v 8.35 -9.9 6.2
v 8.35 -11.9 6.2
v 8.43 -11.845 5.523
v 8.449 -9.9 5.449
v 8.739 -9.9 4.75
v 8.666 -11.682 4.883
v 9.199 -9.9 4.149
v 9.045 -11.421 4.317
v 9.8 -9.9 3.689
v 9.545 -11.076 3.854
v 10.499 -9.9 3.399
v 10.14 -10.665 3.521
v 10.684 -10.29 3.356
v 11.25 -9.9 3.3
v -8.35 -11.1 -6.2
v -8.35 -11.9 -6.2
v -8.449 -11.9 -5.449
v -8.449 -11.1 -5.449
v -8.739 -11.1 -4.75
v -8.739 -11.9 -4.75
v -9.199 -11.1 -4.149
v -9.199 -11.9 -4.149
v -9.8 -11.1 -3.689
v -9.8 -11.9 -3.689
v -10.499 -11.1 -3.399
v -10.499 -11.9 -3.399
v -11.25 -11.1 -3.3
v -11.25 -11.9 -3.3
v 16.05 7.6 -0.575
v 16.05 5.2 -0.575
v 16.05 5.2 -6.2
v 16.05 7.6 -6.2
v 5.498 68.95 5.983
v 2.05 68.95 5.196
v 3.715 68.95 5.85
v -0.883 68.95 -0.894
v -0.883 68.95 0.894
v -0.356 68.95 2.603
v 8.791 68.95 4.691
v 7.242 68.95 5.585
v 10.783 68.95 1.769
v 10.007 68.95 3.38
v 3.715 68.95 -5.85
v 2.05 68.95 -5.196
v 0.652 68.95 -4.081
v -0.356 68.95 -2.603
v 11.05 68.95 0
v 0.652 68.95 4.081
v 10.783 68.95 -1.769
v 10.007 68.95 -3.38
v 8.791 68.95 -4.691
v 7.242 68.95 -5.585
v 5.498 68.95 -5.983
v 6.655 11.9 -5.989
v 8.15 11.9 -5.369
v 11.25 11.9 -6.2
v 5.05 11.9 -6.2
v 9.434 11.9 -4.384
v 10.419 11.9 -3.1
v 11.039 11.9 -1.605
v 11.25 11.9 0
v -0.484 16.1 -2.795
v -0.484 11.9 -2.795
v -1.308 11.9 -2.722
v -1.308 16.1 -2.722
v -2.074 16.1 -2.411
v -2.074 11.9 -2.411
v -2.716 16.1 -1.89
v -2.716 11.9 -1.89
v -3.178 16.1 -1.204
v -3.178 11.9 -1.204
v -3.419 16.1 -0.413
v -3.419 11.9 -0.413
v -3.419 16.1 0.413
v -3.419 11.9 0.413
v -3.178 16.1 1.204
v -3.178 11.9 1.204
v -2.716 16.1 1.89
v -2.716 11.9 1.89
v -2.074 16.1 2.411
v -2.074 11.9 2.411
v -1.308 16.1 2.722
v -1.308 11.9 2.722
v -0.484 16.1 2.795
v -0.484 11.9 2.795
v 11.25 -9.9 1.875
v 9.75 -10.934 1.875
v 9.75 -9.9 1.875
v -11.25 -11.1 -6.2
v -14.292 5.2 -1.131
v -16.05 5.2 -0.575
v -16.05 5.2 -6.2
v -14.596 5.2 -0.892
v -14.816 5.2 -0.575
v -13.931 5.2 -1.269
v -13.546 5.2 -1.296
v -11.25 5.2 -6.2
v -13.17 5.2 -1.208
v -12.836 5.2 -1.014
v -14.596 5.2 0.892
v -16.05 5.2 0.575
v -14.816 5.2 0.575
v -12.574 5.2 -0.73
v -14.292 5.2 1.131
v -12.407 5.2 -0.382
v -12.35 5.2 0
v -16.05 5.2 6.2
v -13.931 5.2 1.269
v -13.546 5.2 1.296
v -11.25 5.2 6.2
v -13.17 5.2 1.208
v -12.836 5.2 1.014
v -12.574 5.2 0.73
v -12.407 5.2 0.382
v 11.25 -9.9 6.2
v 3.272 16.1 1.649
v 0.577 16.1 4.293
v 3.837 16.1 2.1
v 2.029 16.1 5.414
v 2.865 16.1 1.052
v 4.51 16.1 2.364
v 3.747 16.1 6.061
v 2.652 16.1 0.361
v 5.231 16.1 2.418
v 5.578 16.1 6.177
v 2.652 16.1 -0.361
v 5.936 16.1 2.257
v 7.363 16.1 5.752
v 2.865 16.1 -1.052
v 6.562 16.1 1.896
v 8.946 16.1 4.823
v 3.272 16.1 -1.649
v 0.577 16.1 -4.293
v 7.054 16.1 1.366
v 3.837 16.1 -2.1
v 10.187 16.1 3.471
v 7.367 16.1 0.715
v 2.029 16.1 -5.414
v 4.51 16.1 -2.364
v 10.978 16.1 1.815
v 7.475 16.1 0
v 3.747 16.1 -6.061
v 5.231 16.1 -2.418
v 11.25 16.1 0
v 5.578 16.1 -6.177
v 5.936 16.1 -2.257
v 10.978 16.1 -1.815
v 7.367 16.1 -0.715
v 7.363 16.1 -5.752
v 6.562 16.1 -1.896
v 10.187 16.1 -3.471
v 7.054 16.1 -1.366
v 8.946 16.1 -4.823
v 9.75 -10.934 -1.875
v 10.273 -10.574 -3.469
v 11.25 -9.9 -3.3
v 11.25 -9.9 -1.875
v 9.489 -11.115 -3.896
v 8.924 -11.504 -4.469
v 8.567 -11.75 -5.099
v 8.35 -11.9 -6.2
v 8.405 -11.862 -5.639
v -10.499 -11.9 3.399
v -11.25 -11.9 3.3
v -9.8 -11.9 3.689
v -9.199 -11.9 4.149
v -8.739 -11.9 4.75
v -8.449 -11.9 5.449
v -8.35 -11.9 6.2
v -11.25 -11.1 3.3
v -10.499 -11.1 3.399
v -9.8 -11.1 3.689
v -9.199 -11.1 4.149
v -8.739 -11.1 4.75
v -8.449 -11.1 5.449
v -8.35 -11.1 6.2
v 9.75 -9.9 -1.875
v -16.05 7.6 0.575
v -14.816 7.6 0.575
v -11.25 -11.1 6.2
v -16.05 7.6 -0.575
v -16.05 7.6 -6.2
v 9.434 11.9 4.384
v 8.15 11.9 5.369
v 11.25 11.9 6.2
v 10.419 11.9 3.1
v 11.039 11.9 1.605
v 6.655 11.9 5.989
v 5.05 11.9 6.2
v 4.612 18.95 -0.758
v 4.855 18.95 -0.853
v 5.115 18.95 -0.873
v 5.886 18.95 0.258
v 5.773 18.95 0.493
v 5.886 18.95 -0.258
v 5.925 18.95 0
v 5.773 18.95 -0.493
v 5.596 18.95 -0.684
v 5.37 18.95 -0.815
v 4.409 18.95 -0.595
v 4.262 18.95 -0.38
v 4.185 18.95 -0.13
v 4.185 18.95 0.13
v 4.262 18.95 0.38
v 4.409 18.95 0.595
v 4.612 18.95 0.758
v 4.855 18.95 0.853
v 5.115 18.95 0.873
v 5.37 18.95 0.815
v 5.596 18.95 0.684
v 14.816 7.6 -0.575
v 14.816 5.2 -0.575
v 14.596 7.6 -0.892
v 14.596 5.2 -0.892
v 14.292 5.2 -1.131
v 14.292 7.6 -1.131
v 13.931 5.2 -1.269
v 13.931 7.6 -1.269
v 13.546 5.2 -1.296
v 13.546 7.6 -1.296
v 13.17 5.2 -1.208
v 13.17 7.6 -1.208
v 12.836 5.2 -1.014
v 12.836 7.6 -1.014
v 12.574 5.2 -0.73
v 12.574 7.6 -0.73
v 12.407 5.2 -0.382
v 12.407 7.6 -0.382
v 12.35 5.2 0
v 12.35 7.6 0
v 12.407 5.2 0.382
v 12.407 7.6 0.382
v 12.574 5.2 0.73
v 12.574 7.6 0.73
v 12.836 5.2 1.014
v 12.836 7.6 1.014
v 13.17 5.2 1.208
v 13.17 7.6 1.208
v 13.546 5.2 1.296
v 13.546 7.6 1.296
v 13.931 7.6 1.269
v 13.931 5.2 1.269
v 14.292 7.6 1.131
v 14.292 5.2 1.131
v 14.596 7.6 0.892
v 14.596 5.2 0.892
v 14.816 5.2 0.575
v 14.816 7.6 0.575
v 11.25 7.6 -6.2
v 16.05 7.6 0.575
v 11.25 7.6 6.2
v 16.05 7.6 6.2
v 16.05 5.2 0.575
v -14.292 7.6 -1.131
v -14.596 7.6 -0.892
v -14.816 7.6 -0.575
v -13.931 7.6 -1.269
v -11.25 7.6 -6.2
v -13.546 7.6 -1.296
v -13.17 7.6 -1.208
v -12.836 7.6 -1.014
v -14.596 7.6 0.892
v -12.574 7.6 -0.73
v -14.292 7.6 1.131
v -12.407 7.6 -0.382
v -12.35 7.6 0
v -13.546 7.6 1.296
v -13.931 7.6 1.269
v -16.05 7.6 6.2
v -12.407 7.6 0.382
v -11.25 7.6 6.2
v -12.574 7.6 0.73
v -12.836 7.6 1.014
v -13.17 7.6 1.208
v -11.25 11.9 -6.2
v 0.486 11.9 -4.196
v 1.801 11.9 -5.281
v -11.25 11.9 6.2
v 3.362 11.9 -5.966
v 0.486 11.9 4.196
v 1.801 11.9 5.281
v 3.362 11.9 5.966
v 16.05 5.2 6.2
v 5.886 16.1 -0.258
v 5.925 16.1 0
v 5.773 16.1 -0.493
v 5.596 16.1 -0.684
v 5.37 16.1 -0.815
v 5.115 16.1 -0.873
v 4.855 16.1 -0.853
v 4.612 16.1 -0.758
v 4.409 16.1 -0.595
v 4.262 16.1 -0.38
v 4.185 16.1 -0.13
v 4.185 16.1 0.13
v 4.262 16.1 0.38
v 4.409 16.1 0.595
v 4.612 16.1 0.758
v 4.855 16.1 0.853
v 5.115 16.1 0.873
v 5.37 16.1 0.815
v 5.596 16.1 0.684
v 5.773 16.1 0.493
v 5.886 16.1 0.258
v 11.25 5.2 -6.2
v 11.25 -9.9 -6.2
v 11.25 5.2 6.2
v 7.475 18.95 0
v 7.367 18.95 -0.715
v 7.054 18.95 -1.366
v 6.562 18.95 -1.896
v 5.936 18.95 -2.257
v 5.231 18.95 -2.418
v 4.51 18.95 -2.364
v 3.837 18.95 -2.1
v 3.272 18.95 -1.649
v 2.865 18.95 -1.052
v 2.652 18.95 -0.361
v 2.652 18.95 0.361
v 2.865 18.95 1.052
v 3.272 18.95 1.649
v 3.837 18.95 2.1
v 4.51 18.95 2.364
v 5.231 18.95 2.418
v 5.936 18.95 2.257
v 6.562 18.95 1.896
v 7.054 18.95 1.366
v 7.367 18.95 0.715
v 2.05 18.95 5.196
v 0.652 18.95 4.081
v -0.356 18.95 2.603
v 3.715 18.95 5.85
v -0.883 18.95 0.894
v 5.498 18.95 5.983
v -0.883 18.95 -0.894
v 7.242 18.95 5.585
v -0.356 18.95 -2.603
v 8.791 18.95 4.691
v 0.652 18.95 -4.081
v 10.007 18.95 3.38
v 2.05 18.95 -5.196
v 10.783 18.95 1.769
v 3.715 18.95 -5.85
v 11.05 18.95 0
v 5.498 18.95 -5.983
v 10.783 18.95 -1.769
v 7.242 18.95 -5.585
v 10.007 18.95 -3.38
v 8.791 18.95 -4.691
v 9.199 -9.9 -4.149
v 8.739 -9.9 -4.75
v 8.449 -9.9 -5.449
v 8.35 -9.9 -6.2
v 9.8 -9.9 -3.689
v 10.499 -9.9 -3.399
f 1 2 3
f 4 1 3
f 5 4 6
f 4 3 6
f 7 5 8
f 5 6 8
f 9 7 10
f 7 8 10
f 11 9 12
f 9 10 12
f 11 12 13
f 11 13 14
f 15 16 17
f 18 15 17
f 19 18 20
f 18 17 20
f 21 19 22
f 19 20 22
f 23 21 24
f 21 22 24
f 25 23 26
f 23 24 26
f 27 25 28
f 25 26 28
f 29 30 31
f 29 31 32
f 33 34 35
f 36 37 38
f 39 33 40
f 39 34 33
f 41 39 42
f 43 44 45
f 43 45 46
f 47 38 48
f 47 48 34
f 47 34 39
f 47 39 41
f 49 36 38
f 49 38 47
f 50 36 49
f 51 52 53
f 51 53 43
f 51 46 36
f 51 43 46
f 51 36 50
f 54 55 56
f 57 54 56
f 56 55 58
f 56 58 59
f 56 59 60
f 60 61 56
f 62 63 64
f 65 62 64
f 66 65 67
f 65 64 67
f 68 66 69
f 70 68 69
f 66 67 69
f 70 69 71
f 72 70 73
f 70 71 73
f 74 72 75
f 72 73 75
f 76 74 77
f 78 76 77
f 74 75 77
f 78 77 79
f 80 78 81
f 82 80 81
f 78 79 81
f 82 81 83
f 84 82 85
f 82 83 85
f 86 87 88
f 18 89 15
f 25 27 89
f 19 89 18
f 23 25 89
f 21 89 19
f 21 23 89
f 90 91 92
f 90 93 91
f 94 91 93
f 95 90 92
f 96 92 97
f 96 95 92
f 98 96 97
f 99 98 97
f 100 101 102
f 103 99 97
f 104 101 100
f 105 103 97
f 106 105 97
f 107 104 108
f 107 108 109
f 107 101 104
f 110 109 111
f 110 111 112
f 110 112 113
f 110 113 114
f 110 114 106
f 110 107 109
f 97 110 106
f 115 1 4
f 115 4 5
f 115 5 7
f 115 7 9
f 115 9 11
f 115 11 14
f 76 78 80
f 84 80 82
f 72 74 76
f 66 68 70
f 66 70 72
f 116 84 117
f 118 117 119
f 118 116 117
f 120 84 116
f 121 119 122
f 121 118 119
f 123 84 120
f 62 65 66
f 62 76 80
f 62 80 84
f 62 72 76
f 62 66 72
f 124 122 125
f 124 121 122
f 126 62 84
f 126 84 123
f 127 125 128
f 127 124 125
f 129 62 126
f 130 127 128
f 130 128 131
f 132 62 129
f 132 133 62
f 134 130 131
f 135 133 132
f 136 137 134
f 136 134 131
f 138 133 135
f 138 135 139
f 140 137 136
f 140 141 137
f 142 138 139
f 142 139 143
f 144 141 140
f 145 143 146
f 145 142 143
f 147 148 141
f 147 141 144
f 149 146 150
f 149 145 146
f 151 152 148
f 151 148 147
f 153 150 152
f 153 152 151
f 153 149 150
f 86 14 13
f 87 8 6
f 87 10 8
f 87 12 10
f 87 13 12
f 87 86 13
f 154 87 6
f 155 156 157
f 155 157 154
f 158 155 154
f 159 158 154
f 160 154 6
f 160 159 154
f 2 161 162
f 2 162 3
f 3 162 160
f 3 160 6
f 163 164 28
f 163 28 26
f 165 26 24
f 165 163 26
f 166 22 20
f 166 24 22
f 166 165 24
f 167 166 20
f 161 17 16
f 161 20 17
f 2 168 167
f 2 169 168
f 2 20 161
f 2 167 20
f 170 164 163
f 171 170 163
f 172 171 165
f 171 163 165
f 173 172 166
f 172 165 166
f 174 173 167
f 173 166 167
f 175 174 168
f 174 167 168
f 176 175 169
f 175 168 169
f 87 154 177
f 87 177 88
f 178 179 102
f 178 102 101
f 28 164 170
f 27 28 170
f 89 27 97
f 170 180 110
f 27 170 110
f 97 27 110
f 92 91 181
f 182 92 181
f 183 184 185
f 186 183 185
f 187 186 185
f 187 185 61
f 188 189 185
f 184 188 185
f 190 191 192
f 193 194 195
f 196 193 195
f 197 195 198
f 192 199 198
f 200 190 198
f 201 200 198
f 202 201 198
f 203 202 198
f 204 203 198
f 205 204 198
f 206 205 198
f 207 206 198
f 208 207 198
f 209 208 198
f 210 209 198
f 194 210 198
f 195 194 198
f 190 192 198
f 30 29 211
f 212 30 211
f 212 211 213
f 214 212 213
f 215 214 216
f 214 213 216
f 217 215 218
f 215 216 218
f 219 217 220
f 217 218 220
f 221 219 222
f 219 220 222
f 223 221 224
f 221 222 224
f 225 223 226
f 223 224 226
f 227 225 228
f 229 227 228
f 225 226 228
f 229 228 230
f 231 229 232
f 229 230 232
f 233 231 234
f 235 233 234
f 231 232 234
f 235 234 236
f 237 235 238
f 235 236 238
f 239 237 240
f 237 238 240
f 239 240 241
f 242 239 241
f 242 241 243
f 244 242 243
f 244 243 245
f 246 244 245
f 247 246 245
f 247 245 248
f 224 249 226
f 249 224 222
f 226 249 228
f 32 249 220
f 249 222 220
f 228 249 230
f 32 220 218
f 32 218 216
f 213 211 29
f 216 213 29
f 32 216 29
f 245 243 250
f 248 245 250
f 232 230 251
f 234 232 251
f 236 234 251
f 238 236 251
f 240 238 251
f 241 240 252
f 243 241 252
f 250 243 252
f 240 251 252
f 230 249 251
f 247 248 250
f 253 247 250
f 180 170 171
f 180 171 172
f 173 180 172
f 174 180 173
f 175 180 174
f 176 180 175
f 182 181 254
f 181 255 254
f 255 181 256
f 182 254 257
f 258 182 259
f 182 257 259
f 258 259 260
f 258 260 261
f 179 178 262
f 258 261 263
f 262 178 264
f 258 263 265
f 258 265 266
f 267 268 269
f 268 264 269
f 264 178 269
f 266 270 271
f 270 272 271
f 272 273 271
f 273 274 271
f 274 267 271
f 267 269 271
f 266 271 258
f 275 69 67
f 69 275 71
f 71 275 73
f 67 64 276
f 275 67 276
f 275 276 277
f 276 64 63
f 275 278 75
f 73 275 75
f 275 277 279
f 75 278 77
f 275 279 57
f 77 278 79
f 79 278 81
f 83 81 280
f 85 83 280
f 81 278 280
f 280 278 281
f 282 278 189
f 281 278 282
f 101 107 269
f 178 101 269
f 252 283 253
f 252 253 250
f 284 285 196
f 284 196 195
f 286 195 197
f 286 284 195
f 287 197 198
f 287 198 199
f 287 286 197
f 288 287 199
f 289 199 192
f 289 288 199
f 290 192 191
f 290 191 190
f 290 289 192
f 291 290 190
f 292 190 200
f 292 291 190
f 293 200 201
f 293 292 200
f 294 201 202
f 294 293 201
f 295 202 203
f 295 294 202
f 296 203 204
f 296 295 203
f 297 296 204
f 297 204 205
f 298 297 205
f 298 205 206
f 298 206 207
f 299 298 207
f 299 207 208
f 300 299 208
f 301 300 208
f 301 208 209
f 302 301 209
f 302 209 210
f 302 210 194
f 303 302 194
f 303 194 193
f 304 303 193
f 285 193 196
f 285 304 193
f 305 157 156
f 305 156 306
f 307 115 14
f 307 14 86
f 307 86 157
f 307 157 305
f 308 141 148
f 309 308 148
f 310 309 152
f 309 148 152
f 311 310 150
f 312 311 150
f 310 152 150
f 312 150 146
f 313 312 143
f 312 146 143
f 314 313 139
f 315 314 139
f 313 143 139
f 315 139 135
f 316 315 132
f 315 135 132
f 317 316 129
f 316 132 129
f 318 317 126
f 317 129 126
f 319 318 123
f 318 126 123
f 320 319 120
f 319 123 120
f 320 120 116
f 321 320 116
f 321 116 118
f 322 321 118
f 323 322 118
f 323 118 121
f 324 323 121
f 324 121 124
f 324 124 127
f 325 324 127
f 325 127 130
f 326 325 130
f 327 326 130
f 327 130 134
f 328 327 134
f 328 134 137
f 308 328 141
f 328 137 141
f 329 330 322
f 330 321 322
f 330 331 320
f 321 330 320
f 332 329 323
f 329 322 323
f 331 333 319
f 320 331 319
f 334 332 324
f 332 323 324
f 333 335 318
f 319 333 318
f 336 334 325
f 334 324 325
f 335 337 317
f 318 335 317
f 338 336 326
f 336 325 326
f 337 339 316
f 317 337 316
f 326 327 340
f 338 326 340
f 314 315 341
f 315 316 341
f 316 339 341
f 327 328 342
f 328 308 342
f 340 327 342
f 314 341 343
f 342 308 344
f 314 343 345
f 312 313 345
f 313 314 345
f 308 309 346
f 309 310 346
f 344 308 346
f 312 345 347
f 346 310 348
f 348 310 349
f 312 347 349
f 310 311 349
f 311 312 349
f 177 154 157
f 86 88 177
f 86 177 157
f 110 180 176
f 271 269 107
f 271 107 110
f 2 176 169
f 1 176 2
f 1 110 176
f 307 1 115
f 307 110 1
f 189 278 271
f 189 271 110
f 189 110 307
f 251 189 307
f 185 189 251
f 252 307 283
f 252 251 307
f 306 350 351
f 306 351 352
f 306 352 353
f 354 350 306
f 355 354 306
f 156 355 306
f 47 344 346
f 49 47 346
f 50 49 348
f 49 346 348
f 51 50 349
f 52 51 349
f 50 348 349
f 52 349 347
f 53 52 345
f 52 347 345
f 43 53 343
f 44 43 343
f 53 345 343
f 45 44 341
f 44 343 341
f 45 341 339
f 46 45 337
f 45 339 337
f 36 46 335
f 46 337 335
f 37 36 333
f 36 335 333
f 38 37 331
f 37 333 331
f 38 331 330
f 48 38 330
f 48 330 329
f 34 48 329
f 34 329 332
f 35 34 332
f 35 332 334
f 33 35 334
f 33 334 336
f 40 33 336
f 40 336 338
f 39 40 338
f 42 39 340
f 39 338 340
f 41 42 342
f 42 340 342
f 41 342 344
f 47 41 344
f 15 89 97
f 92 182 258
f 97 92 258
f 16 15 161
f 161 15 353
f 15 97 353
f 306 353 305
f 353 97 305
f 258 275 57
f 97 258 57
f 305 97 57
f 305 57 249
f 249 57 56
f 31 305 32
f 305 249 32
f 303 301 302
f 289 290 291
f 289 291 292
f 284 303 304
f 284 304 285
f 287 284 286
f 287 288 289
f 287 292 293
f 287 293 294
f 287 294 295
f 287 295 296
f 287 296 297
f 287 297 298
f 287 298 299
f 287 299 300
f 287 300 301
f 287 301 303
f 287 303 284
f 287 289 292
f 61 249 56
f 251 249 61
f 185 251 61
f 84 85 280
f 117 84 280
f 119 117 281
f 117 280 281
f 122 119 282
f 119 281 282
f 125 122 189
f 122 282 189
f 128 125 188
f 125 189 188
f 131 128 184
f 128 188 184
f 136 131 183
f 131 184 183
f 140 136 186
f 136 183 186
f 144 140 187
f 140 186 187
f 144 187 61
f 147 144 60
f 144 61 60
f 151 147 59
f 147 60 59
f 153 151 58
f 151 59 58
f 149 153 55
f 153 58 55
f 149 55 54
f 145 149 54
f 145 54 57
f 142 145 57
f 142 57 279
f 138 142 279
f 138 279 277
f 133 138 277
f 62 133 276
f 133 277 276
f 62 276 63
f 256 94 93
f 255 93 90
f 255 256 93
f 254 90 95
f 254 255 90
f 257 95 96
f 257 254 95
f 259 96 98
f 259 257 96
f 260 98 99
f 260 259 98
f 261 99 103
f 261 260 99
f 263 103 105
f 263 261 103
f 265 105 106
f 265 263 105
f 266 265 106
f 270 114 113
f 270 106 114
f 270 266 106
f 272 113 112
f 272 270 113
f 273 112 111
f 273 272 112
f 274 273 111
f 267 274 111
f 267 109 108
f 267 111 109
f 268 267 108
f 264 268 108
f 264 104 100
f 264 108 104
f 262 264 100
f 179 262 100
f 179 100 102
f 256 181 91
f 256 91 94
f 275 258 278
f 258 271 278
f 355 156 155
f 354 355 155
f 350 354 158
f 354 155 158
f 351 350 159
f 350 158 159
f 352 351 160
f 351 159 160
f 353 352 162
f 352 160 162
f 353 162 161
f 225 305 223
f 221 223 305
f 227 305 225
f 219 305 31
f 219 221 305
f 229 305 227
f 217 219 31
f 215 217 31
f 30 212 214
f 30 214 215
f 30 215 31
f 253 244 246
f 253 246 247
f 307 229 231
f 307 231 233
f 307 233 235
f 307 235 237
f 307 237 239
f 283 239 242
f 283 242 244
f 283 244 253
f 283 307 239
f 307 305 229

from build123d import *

# Parameters (mm, degrees)
SALIENTE_EXTRUIR1_DEPTH = 6.2
SALIENTE_EXTRUIR2_DEPTH = 4.2
CORTAR_EXTRUIR1_REACH   = 28.006
CORTAR_EXTRUIR3_DEPTH   = 0.8
CROQUIS4_5_W            = 1.5
CROQUIS4_5_H            = 3.75
CORTAR_EXTRUIR4_DEPTH   = 2
CORTAR_EXTRUIR5_DEPTH   = 26.895414652
CROQUIS7_R              = 2.425
CROQUIS7_R_2            = 0.875
SALIENTE_EXTRUIR4_DEPTH = 2.85
SKETCH1_R               = 6
BOSS_EXTRUDE1_DEPTH     = 50


with BuildPart() as part:
    # Croquis1 → Saliente-Extruir1 (new, symmetric)
    with BuildSketch(Plane.XY):
        Polygon((-11.25, 5.2), (-11.25, -11.9), (11.25, -11.9), (11.25, 5.2), (16.05, 5.2), (16.05, 7.6), (11.25, 7.6), (11.25, 11.9), (-11.25, 11.9), (-11.25, 7.6), (-16.05, 7.6), (-16.05, 5.2), align=None)
    extrude(amount=SALIENTE_EXTRUIR1_DEPTH, both=True)

    # Croquis2 → Saliente-Extruir2 (add)
    with BuildSketch(Plane(origin=(0, 11.9, 0), x_dir=(1, 0, 0), z_dir=(0, 1, 0))):
        with BuildLine():
            ThreePointArc((-0.484210526, -2.79508745), (11.25, 0), (-0.484210526, 2.79508745))
            ThreePointArc((-0.484210526, 2.79508745), (-3.45, 0), (-0.484210526, -2.79508745))
        make_face()
    extrude(amount=SALIENTE_EXTRUIR2_DEPTH)

    # Croquis3 → Cortar-Extruir1 (cut, up to next)
    with BuildSketch(Plane(origin=(0, 7.6, 0), x_dir=(1, 0, 0), z_dir=(0, 1, 0)), mode=Mode.PRIVATE) as cortar_extruir1_sk1:
        with BuildLine():
            Line((16.05, 0.575), (14.815922382, 0.575))
            ThreePointArc((14.815922382, 0.575), (12.35, 0), (14.815922382, -0.575))
            Line((14.815922382, -0.575), (16.05, -0.575))
            Line((16.05, -0.575), (16.05, 0.575))
        make_face()
    cortar_extruir1_tool1 = extrude(cortar_extruir1_sk1.sketch, amount=-CORTAR_EXTRUIR1_REACH, mode=Mode.PRIVATE) & part.part
    # Croquis3 → Cortar-Extruir1 (cut, up to next)
    with BuildSketch(Plane(origin=(0, 7.6, 0), x_dir=(1, 0, 0), z_dir=(0, 1, 0)), mode=Mode.PRIVATE) as cortar_extruir1_sk2:
        with BuildLine():
            Line((-16.05, 0.575), (-14.815922382, 0.575))
            ThreePointArc((-14.815922382, 0.575), (-12.35, 0), (-14.815922382, -0.575))
            Line((-14.815922382, -0.575), (-16.05, -0.575))
            Line((-16.05, -0.575), (-16.05, 0.575))
        make_face()
    cortar_extruir1_tool2 = extrude(cortar_extruir1_sk2.sketch, amount=-CORTAR_EXTRUIR1_REACH, mode=Mode.PRIVATE) & part.part
    add(cortar_extruir1_tool1.solids().sort_by_distance((14.012834, 7.6, 0))[0], mode=Mode.SUBTRACT)
    add(cortar_extruir1_tool2.solids().sort_by_distance((-14.012834, 7.6, 0))[0], mode=Mode.SUBTRACT)

    # Croquis4 → Cortar-Extruir3 (cut)
    with BuildSketch(Plane.XZ.offset(11.9)):
        with BuildLine():
            Line((-11.25, 6.2), (-11.25, 3.3))
            ThreePointArc((-11.25, 3.3), (-9.199390335, 4.149390335), (-8.35, 6.2))
            Line((-8.35, 6.2), (-11.25, 6.2))
        make_face()
        with BuildLine():
            ThreePointArc((-8.35, -6.2), (-9.199390335, -4.149390335), (-11.25, -3.3))
            Line((-11.25, -3.3), (-11.25, -6.2))
            Line((-11.25, -6.2), (-8.35, -6.2))
        make_face()
    extrude(amount=-CORTAR_EXTRUIR3_DEPTH, mode=Mode.SUBTRACT)

    # Croquis4<5> → Cortar-Extruir4 (cut)
    with BuildSketch(Plane.XZ.offset(11.9)):
        with BuildLine():
            Line((11.25, 6.2), (8.35, 6.2))
            ThreePointArc((8.35, 6.2), (9.199390335, 4.149390335), (11.25, 3.3))
            Line((11.25, 3.3), (11.25, 6.2))
        make_face()
        with BuildLine():
            ThreePointArc((11.25, -3.3), (9.199390335, -4.149390335), (8.35, -6.2))
            Line((8.35, -6.2), (11.25, -6.2))
            Line((11.25, -6.2), (11.25, -3.3))
        make_face()
        with Locations((10.5, 0)):
            Rectangle(CROQUIS4_5_W, CROQUIS4_5_H)
    extrude(amount=-CORTAR_EXTRUIR4_DEPTH, mode=Mode.SUBTRACT)

    # Croquis6 → Cortar-Extruir5 (cut, through all)
    with BuildSketch(Plane(origin=(0, 0, -6.2), x_dir=(-1, 0, 0), z_dir=(0, 0, -1))):
        Polygon((-11.25, -9.9), (-8.35, -11.9), (-11.25, -11.9), align=None)
    extrude(amount=-CORTAR_EXTRUIR5_DEPTH, mode=Mode.SUBTRACT)

    # Croquis7 → Saliente-Extruir4 (add)
    with BuildSketch(Plane(origin=(0, 16.1, 0), x_dir=(1, 0, 0), z_dir=(0, 1, 0))):
        with Locations((5.05, 0)):
            Circle(CROQUIS7_R)
        with Locations((5.05, 0)):
            Circle(CROQUIS7_R_2, mode=Mode.SUBTRACT)
    extrude(amount=SALIENTE_EXTRUIR4_DEPTH)

    # Sketch1 → Boss-Extrude1 (add)
    with BuildSketch(Plane(origin=(0, 18.95, 0), x_dir=(1, 0, 0), z_dir=(0, 1, 0))):
        with Locations((5.05, 0)):
            Circle(SKETCH1_R)
    extrude(amount=BOSS_EXTRUDE1_DEPTH)


solid = part.part
